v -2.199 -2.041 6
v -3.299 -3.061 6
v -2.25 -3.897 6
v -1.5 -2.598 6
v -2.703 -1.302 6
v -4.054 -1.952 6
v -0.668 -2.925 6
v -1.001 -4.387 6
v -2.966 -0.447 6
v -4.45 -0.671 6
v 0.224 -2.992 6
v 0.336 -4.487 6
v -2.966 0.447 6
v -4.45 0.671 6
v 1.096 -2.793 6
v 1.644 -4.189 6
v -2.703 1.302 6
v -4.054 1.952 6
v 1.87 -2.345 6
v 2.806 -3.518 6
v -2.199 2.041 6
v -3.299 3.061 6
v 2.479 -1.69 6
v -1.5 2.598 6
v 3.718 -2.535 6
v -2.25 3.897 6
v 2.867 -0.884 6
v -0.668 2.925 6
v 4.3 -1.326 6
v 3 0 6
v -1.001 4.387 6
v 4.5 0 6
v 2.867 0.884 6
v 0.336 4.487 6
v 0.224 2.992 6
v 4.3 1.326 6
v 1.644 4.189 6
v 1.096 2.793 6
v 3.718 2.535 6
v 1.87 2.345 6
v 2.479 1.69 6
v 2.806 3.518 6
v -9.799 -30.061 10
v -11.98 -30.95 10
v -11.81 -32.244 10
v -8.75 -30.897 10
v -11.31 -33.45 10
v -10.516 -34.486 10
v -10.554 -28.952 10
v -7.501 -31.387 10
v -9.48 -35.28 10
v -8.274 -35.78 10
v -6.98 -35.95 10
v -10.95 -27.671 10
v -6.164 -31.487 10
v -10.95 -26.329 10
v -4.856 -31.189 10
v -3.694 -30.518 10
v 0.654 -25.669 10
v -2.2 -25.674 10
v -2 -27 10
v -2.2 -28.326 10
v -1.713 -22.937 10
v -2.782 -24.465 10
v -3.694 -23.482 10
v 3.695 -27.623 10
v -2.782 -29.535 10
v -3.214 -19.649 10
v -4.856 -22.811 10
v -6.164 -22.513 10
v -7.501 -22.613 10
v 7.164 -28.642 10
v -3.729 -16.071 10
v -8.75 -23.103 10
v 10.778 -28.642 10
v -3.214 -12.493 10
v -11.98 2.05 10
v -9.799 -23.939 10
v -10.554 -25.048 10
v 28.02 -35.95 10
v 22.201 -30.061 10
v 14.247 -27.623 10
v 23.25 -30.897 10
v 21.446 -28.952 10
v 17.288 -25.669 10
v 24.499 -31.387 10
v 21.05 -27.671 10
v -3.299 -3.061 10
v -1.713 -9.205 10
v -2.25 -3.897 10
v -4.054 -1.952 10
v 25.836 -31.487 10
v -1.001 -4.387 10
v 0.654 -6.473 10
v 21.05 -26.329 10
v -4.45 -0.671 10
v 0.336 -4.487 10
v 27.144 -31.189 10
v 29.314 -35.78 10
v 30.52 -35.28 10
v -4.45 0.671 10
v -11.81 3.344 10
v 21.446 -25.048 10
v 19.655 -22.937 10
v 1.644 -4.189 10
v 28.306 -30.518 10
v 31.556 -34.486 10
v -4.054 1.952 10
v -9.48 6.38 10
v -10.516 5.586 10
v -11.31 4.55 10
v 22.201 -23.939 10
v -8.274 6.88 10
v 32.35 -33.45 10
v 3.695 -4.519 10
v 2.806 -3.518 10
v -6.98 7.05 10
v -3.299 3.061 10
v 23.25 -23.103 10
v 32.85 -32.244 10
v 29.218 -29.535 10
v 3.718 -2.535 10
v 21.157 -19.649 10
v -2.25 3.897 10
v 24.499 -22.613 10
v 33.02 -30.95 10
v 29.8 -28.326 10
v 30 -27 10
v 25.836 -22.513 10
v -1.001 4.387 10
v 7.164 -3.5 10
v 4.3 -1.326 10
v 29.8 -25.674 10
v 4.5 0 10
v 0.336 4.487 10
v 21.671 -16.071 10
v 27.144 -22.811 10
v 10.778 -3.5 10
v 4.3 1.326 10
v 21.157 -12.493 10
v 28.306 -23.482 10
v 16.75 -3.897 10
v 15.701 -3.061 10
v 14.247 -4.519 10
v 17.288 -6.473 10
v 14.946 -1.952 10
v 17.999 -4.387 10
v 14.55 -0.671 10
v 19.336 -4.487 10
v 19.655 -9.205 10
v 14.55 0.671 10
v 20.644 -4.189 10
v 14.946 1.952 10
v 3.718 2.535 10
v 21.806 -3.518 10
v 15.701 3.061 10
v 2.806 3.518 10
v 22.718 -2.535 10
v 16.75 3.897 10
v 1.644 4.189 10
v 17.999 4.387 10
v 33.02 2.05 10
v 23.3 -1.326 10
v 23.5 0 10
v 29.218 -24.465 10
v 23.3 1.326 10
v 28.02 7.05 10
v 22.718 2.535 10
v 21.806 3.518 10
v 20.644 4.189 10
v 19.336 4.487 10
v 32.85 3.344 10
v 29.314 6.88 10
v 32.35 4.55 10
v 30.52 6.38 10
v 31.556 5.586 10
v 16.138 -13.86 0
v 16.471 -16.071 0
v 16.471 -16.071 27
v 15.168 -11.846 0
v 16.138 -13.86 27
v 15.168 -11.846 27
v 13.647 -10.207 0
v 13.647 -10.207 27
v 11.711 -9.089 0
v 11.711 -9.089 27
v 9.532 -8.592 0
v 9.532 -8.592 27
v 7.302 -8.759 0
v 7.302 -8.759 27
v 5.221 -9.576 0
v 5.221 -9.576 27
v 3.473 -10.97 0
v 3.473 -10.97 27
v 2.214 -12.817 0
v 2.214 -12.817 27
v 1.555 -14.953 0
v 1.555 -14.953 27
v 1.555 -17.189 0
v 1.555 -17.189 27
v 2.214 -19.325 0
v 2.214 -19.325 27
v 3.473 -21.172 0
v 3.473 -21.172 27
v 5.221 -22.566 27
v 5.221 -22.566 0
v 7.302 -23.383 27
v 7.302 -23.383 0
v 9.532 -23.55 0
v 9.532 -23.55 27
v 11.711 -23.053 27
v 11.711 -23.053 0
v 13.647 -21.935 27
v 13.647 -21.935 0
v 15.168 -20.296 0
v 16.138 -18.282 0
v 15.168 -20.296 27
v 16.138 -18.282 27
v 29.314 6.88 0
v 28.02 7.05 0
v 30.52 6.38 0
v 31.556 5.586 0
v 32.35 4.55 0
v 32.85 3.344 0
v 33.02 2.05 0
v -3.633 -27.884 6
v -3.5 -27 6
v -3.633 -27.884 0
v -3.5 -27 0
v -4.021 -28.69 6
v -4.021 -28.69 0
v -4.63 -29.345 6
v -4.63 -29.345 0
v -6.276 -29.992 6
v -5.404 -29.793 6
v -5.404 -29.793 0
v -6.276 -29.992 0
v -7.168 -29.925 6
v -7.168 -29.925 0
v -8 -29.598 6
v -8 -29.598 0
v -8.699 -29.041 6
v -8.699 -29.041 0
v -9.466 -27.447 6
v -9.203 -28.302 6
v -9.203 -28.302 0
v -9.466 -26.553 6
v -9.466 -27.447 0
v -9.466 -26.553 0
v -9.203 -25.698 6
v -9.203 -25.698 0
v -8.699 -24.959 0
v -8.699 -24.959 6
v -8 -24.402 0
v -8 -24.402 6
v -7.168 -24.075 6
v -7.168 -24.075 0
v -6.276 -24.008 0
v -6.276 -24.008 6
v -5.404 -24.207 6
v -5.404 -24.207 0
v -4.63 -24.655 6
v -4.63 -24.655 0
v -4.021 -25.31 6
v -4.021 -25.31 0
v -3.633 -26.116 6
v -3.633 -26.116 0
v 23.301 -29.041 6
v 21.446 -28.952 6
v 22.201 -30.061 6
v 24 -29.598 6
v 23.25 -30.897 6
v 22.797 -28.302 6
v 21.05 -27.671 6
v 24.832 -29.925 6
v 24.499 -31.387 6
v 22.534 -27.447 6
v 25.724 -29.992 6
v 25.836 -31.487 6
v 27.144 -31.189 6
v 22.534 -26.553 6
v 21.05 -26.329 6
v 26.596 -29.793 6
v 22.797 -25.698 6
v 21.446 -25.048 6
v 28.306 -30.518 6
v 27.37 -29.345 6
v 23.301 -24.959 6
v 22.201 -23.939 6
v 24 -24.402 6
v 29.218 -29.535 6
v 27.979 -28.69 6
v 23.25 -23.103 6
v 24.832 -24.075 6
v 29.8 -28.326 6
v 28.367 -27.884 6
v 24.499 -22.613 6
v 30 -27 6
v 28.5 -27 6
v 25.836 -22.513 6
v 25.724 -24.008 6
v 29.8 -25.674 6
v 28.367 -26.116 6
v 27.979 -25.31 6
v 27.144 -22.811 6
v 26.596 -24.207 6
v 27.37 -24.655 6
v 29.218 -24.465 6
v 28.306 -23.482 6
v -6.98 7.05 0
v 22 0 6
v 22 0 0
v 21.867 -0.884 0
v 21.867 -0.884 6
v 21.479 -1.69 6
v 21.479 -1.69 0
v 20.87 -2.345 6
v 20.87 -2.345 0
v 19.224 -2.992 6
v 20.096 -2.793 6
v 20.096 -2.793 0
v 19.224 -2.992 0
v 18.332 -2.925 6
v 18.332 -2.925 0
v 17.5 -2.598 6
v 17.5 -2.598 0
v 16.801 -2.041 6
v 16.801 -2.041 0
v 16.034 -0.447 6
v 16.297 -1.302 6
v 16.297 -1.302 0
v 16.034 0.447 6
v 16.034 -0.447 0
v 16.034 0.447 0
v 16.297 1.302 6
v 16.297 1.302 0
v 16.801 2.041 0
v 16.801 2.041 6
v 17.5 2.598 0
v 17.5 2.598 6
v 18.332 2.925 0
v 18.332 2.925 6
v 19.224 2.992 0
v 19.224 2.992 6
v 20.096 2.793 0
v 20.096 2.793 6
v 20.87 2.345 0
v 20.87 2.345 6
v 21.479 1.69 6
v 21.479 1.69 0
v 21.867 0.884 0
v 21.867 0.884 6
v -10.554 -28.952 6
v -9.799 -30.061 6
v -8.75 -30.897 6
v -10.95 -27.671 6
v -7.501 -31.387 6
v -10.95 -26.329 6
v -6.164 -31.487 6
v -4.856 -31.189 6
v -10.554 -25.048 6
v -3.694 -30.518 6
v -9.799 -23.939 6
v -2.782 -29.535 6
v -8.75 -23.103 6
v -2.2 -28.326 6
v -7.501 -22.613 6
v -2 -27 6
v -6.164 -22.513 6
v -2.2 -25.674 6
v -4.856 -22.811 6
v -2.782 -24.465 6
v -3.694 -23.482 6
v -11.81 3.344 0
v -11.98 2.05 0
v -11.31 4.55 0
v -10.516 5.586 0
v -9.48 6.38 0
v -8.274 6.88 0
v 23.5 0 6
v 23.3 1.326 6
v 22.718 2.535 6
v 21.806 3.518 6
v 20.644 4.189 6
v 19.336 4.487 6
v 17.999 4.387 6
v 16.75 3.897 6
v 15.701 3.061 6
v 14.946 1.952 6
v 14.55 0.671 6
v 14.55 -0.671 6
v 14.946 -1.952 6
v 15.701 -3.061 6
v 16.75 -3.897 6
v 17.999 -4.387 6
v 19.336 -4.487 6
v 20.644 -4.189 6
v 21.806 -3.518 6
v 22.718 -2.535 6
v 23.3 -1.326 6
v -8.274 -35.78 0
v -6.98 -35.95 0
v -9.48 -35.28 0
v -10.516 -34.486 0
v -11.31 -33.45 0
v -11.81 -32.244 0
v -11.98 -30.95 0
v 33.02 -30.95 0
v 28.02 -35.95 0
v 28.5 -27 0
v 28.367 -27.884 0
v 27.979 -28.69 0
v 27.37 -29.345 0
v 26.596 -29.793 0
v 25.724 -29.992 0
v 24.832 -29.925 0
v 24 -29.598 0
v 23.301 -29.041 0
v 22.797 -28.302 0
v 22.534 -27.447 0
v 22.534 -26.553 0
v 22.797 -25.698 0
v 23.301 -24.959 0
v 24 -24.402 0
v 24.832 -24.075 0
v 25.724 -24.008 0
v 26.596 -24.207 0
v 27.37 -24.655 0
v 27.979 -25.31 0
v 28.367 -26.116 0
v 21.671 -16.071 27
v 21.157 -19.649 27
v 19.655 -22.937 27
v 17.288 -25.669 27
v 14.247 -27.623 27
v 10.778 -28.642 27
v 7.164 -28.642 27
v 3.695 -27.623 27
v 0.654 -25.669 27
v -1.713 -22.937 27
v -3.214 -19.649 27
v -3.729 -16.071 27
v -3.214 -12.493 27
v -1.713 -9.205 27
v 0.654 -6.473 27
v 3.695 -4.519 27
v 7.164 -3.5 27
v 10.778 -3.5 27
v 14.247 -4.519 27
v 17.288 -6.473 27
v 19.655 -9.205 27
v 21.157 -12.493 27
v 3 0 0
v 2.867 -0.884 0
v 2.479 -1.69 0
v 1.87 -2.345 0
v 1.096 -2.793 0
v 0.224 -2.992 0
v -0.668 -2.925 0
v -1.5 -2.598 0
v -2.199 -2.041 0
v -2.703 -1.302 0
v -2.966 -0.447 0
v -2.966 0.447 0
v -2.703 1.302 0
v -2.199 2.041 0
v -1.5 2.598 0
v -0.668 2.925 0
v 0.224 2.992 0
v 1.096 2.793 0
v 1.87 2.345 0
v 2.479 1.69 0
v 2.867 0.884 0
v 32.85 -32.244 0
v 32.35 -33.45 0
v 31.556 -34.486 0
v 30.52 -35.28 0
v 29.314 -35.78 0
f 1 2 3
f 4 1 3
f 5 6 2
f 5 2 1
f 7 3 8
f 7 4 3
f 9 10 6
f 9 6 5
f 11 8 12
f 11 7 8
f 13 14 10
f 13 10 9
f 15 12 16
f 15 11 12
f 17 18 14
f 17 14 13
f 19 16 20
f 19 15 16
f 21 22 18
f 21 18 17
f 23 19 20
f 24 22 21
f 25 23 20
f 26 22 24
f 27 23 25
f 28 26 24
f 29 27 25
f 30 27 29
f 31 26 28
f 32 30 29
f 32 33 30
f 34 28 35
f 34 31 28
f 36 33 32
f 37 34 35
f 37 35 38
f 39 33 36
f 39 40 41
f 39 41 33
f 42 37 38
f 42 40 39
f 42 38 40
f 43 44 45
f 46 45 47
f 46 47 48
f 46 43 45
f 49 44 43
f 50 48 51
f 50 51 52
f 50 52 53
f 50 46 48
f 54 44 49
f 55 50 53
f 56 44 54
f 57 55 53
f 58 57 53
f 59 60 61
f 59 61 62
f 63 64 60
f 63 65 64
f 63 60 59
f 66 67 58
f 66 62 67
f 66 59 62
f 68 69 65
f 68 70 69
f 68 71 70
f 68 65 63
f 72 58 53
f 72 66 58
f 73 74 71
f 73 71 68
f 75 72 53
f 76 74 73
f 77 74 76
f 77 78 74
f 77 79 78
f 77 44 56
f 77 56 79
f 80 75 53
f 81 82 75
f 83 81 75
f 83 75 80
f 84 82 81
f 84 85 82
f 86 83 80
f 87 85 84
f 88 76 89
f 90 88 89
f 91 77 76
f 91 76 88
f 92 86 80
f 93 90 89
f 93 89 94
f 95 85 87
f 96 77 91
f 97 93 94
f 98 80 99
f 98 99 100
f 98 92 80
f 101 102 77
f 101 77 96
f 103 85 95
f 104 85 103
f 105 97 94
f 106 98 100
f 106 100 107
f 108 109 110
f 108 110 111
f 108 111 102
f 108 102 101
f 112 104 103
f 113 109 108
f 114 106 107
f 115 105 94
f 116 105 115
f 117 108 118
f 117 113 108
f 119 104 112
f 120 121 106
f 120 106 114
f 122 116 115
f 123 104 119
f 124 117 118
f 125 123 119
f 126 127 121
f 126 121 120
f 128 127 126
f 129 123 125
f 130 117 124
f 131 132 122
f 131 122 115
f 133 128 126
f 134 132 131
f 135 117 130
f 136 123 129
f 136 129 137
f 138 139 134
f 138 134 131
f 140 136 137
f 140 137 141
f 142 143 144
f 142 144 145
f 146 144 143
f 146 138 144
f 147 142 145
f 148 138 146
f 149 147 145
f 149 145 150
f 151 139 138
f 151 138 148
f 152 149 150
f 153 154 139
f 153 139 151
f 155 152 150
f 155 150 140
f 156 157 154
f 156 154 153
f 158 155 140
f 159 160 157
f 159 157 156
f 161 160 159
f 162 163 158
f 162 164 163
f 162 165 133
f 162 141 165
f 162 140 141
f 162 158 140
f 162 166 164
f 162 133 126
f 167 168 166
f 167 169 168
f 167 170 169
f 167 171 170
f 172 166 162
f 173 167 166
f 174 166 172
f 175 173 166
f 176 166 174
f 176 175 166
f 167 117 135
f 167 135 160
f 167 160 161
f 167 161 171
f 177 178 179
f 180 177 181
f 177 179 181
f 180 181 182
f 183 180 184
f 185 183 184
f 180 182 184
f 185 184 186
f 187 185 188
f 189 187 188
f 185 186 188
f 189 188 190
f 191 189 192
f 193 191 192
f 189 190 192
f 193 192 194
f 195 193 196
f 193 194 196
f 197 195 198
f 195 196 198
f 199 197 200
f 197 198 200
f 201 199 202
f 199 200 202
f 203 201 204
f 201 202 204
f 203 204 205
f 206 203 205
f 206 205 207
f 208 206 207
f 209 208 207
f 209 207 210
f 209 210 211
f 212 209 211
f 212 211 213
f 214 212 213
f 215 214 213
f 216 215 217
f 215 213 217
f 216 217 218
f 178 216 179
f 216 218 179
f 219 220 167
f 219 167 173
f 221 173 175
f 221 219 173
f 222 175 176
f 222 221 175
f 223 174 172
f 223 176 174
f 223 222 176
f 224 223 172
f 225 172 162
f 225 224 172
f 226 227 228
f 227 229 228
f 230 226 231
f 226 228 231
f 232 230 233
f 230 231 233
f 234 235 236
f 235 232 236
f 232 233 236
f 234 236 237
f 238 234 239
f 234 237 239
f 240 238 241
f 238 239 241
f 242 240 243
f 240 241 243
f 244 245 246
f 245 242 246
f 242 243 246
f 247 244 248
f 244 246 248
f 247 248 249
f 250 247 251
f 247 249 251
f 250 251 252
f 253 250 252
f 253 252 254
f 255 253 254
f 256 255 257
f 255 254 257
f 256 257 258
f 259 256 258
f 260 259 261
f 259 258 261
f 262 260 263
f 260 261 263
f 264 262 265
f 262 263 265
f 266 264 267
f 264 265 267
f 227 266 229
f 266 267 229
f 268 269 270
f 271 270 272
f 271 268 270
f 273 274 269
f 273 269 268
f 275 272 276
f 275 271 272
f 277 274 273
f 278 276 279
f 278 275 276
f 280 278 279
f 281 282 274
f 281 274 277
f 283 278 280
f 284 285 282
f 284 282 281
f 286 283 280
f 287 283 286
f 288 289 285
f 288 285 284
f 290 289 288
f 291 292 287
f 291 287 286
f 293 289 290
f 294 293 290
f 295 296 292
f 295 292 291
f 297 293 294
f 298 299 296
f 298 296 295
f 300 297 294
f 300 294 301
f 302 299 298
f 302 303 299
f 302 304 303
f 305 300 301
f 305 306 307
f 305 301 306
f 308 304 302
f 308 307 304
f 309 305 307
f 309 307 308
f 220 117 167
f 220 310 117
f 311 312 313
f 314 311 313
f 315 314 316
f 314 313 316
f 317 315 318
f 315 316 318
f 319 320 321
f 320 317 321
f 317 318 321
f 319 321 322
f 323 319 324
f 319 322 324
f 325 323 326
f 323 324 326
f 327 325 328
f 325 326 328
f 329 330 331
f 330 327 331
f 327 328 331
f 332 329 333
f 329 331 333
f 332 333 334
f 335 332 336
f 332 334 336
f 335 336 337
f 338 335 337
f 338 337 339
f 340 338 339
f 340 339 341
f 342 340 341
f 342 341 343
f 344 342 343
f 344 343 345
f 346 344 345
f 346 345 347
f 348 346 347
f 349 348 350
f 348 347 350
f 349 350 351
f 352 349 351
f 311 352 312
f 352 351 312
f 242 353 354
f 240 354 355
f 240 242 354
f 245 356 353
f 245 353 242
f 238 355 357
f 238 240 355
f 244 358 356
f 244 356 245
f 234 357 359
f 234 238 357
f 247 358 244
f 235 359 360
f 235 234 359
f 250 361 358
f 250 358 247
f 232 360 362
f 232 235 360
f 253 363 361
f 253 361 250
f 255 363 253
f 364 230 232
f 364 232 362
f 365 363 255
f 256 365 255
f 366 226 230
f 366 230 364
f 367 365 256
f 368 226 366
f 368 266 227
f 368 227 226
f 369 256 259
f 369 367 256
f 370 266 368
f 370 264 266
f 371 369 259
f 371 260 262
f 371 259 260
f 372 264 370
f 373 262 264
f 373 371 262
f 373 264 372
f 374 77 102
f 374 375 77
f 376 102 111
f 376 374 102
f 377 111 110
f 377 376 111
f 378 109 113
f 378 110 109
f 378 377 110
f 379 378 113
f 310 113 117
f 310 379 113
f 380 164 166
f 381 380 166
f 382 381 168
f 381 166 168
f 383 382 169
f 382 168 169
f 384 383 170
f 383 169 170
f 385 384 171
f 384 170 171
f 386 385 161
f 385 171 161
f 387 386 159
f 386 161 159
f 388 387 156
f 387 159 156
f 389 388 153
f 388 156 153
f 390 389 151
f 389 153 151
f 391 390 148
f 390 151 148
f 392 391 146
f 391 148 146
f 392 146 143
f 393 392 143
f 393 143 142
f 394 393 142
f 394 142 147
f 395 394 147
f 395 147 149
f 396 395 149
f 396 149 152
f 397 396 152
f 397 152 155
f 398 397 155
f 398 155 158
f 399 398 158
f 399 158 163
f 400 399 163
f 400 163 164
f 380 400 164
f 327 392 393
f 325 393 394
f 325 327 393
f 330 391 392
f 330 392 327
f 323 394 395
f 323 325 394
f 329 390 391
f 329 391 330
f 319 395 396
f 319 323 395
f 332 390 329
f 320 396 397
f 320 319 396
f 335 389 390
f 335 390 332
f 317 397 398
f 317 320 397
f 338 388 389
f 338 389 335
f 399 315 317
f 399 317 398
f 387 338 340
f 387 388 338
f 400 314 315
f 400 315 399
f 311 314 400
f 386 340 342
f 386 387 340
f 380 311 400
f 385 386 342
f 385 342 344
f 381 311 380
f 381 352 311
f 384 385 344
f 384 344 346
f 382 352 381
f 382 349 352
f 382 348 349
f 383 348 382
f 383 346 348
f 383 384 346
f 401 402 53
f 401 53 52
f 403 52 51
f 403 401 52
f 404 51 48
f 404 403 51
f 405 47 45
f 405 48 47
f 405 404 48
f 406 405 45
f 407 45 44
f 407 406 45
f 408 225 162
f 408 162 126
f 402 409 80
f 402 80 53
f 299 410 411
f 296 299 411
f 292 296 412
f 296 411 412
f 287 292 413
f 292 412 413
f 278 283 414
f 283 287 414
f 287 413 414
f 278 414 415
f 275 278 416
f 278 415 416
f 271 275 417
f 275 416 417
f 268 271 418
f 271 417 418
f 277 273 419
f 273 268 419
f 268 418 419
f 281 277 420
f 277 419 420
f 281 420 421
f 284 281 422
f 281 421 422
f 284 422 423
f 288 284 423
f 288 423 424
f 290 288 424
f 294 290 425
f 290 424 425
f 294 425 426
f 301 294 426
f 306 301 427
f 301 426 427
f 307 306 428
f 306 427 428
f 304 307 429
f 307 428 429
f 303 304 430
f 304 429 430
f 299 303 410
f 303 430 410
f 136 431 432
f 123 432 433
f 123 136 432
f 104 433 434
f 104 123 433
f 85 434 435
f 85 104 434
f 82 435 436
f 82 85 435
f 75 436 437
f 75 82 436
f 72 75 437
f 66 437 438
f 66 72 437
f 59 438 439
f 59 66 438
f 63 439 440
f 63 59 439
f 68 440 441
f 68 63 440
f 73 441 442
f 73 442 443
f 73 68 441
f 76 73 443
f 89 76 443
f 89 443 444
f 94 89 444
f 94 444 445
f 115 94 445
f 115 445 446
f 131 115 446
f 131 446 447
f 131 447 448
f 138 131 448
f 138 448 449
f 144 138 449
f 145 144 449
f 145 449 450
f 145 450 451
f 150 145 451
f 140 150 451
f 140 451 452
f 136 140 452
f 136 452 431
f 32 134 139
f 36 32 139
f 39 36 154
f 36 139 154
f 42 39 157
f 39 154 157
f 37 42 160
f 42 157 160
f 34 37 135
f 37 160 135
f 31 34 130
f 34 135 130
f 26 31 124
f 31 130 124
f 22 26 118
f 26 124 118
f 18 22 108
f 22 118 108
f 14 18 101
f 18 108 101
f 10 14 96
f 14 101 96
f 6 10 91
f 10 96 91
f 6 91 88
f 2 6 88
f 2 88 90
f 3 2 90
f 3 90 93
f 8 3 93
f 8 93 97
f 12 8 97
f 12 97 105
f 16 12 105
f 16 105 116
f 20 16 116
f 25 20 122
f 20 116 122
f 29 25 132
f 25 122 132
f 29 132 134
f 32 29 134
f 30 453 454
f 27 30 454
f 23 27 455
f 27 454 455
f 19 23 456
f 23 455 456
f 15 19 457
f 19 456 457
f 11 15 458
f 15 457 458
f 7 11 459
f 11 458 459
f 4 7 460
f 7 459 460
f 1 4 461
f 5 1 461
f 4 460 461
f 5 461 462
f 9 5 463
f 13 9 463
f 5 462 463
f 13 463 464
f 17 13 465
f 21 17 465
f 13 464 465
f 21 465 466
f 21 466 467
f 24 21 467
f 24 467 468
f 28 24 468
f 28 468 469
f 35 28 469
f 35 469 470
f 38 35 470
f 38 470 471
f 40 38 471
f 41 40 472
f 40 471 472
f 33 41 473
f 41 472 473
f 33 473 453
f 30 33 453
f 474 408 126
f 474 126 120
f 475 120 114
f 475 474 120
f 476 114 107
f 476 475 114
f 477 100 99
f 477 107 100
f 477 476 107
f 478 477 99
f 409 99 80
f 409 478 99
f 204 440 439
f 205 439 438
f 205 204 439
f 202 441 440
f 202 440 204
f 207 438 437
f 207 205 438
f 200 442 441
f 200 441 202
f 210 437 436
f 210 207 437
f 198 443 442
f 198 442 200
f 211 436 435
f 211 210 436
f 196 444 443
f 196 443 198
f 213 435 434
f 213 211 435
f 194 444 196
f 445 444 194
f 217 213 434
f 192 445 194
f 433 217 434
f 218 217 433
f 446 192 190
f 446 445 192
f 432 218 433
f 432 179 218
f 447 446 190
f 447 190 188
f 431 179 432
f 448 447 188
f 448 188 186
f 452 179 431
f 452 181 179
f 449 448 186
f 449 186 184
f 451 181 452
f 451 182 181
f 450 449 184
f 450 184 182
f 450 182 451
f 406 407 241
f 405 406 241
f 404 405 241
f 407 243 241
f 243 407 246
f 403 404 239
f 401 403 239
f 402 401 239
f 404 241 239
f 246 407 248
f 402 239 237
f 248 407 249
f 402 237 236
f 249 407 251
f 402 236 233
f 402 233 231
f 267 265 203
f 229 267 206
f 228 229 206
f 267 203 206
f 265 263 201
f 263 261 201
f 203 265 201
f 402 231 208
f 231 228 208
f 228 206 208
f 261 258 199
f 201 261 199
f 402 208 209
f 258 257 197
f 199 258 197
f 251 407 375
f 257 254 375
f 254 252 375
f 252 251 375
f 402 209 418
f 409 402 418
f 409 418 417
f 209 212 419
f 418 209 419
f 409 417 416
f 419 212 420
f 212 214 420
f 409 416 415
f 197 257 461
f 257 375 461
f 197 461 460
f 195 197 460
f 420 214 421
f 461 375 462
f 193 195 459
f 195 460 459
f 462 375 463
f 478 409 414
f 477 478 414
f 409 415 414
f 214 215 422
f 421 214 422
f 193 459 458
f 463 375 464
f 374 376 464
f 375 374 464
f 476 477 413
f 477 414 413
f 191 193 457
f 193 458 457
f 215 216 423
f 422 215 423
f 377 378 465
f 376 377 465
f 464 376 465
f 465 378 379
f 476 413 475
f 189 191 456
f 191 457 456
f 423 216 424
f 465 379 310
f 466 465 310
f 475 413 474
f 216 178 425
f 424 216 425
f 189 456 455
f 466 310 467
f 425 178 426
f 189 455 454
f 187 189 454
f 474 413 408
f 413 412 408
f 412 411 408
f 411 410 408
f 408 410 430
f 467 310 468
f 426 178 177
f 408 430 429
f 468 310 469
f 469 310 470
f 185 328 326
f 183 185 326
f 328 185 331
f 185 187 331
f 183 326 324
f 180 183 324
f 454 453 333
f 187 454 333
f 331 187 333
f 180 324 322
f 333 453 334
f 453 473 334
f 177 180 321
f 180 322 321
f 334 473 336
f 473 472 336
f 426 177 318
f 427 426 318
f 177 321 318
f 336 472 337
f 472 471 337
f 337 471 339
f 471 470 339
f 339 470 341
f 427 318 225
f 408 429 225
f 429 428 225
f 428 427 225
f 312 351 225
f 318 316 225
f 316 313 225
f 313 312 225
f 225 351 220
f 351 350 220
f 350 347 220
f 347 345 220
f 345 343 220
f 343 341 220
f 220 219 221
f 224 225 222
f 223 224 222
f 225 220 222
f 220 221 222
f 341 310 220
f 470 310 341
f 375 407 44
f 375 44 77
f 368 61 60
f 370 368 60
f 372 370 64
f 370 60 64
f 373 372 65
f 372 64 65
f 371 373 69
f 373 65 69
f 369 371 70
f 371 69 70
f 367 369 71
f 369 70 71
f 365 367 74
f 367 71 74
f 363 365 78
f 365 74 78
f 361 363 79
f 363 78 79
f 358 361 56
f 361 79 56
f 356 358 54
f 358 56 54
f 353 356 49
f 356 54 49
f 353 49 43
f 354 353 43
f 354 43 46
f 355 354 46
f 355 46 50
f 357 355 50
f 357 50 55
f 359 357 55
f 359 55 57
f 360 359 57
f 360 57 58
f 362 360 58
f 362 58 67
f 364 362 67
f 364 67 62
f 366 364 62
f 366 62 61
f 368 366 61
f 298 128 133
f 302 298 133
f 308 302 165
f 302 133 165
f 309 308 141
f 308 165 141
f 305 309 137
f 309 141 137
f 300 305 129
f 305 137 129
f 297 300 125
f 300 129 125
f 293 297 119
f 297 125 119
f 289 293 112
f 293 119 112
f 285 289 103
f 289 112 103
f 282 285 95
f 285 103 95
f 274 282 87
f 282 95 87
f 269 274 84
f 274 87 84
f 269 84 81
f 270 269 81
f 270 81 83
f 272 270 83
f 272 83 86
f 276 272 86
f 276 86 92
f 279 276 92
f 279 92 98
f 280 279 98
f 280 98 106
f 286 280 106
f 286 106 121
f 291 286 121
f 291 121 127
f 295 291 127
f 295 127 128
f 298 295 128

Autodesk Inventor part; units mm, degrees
ref_plane "YZ Plane" through (0, 0, 0) normal (1, 0, 0) x (0, 1, 0)
ref_plane "XZ Plane" through (0, 0, 0) normal (0, 1, 0) x (-1, 0, 0)
ref_plane "XY Plane" through (0, 0, 0) normal (0, 0, 1) x (1, 0, 0)
sketch "Sketch1" plane through (0, 0, 0) normal (0, 0, 1) x (1, 0, 0)
  circle A0 centre (19, 0) radius 4.65 projected
  circle A1 centre (-6.5, -27) radius 4.65 projected
  circle A2 centre (0, 0) radius 4.65 projected
  circle A3 centre (25.5, -27) radius 4.65 projected
  arc A4 (28.02, -35.95) -> (33.02, -30.95) centre (28.02, -30.95) ccw projected
  line L0 (33.02, 2.05) -> (33.02, -30.95) projected
  arc A5 (33.02, 2.05) -> (28.02, 7.05) centre (28.02, 2.05) ccw projected
  line L1 (-6.98, 7.05) -> (28.02, 7.05) projected
  arc A6 (-6.98, 7.05) -> (-11.98, 2.05) centre (-6.98, 2.05) ccw projected
  line L2 (-11.98, -30.95) -> (-11.98, 2.05) projected
  arc A7 (-11.98, -30.95) -> (-6.98, -35.95) centre (-6.98, -30.95) ccw projected
  line L3 (28.02, -35.95) -> (-6.98, -35.95) projected
  arc A8 (20.169, -15.05) -> (19.169, -16.05) centre (20.169, -16.05) ccw projected
  line L4 (20.169, -15.05) -> (21.169, -15.05) projected
  line L5 (21.169, -15.05) -> (21.169, -17.95) projected
  line L6 (21.169, -17.95) -> (20.169, -17.95) projected
  arc A9 (19.169, -16.95) -> (20.169, -17.95) centre (20.169, -16.95) ccw projected
  line L7 (19.169, -16.95) -> (19.169, -22.1) projected
  line L8 (19.169, -22.1) -> (-2.331, -22.1) projected
  line L9 (-2.331, -22.1) -> (-2.331, -10.9) projected
  line L10 (-2.331, -10.9) -> (19.169, -10.9) projected
  line L11 (19.169, -10.9) -> (19.169, -16.05) projected
  circle A10 centre (-6.48, -12.9) radius 2 projected
  circle A11 centre (-3.844, -16.512) radius 0.75 projected
  circle A12 centre (23.72, -20.1) radius 2 projected
  line L12 (19.169, -16.05) -> (19.169, -16.95)
  circle A13 centre (25.5, -27) radius 3
  circle A14 centre (-6.5, -27) radius 3
  circle A15 centre (0, 0) radius 3
  circle A16 centre (19, 0) radius 3
  circle A17 centre (19, 0) radius 5
  dimension "d8" = 10
  dimension "d13" = 6
  dimension "d14" = 6
  dimension "d15" = 6
  dimension "d16" = 6
extrude "Extrusion1" add sketch "Sketch1" along normal blind 10 contours A0 | A1 | A2 | A3 | L3 A7 L2 A6 L1 A5 L0 A4 | L4 L5 L6 A9 L12 A8 | L12 L7 L8 L9 L10 L11 | A10 | A11 | A12 | A17
sketch "Sketch3" plane through (0, 0, 10) normal (0, 0, 1) x (1, 0, 0)
  line L0 (32.9618, -36.0107) -> (-11.98, 7.05)
  line L1 (-11.98, -35.95) -> (33.02, 7.05)
  circle A0 centre (8.9711, -16.071) radius 12.7
  circle A1 centre (-6.5, -27) radius 3 projected
  circle A2 centre (19, 0) radius 3 projected
  point P0 (0, 0)
  dimension "d2" = 25.4
  dimension "d17" = 2.2
extrude "Extrusion2" add sketch "Sketch3" along normal blind 17 contours A0 L1 L0 | L0 L1 A0 | L1 A0 L0 | L0 A0 L1
sketch "Sketch4" plane through (8.9711, -16.071, 27) normal (0, 0, 1) x (1, 0, 0)
  circle A0 centre (0, 0) radius 12.7 projected
  circle A1 centre (0, 0) radius 7.5
  point P0 (-8.9711, 16.071)
  dimension "d5" = 15
extrude "Extrusion3" cut sketch "Sketch4" against normal through all contours A1
sketch "Sketch5" plane through (0, 0, 10) normal (0, 0, 1) x (1, 0, 0)
  circle A0 centre (19, 0) radius 3 projected
  circle A1 centre (19, 0) radius 4.5
  circle A2 centre (0, 0) radius 4.5
  circle A3 centre (25.5, -27) radius 3 projected
  circle A4 centre (25.5, -27) radius 4.5
  circle A5 centre (-6.5, -27) radius 3 projected
  circle A6 centre (-6.5, -27) radius 4.5
  dimension "d9" = 9
  dimension "d10" = 9
  dimension "d18" = 9
  dimension "d19" = 9
extrude "Extrusion4" cut sketch "Sketch5" against normal blind 4
properties part number "Mount_DMD_KM100"
